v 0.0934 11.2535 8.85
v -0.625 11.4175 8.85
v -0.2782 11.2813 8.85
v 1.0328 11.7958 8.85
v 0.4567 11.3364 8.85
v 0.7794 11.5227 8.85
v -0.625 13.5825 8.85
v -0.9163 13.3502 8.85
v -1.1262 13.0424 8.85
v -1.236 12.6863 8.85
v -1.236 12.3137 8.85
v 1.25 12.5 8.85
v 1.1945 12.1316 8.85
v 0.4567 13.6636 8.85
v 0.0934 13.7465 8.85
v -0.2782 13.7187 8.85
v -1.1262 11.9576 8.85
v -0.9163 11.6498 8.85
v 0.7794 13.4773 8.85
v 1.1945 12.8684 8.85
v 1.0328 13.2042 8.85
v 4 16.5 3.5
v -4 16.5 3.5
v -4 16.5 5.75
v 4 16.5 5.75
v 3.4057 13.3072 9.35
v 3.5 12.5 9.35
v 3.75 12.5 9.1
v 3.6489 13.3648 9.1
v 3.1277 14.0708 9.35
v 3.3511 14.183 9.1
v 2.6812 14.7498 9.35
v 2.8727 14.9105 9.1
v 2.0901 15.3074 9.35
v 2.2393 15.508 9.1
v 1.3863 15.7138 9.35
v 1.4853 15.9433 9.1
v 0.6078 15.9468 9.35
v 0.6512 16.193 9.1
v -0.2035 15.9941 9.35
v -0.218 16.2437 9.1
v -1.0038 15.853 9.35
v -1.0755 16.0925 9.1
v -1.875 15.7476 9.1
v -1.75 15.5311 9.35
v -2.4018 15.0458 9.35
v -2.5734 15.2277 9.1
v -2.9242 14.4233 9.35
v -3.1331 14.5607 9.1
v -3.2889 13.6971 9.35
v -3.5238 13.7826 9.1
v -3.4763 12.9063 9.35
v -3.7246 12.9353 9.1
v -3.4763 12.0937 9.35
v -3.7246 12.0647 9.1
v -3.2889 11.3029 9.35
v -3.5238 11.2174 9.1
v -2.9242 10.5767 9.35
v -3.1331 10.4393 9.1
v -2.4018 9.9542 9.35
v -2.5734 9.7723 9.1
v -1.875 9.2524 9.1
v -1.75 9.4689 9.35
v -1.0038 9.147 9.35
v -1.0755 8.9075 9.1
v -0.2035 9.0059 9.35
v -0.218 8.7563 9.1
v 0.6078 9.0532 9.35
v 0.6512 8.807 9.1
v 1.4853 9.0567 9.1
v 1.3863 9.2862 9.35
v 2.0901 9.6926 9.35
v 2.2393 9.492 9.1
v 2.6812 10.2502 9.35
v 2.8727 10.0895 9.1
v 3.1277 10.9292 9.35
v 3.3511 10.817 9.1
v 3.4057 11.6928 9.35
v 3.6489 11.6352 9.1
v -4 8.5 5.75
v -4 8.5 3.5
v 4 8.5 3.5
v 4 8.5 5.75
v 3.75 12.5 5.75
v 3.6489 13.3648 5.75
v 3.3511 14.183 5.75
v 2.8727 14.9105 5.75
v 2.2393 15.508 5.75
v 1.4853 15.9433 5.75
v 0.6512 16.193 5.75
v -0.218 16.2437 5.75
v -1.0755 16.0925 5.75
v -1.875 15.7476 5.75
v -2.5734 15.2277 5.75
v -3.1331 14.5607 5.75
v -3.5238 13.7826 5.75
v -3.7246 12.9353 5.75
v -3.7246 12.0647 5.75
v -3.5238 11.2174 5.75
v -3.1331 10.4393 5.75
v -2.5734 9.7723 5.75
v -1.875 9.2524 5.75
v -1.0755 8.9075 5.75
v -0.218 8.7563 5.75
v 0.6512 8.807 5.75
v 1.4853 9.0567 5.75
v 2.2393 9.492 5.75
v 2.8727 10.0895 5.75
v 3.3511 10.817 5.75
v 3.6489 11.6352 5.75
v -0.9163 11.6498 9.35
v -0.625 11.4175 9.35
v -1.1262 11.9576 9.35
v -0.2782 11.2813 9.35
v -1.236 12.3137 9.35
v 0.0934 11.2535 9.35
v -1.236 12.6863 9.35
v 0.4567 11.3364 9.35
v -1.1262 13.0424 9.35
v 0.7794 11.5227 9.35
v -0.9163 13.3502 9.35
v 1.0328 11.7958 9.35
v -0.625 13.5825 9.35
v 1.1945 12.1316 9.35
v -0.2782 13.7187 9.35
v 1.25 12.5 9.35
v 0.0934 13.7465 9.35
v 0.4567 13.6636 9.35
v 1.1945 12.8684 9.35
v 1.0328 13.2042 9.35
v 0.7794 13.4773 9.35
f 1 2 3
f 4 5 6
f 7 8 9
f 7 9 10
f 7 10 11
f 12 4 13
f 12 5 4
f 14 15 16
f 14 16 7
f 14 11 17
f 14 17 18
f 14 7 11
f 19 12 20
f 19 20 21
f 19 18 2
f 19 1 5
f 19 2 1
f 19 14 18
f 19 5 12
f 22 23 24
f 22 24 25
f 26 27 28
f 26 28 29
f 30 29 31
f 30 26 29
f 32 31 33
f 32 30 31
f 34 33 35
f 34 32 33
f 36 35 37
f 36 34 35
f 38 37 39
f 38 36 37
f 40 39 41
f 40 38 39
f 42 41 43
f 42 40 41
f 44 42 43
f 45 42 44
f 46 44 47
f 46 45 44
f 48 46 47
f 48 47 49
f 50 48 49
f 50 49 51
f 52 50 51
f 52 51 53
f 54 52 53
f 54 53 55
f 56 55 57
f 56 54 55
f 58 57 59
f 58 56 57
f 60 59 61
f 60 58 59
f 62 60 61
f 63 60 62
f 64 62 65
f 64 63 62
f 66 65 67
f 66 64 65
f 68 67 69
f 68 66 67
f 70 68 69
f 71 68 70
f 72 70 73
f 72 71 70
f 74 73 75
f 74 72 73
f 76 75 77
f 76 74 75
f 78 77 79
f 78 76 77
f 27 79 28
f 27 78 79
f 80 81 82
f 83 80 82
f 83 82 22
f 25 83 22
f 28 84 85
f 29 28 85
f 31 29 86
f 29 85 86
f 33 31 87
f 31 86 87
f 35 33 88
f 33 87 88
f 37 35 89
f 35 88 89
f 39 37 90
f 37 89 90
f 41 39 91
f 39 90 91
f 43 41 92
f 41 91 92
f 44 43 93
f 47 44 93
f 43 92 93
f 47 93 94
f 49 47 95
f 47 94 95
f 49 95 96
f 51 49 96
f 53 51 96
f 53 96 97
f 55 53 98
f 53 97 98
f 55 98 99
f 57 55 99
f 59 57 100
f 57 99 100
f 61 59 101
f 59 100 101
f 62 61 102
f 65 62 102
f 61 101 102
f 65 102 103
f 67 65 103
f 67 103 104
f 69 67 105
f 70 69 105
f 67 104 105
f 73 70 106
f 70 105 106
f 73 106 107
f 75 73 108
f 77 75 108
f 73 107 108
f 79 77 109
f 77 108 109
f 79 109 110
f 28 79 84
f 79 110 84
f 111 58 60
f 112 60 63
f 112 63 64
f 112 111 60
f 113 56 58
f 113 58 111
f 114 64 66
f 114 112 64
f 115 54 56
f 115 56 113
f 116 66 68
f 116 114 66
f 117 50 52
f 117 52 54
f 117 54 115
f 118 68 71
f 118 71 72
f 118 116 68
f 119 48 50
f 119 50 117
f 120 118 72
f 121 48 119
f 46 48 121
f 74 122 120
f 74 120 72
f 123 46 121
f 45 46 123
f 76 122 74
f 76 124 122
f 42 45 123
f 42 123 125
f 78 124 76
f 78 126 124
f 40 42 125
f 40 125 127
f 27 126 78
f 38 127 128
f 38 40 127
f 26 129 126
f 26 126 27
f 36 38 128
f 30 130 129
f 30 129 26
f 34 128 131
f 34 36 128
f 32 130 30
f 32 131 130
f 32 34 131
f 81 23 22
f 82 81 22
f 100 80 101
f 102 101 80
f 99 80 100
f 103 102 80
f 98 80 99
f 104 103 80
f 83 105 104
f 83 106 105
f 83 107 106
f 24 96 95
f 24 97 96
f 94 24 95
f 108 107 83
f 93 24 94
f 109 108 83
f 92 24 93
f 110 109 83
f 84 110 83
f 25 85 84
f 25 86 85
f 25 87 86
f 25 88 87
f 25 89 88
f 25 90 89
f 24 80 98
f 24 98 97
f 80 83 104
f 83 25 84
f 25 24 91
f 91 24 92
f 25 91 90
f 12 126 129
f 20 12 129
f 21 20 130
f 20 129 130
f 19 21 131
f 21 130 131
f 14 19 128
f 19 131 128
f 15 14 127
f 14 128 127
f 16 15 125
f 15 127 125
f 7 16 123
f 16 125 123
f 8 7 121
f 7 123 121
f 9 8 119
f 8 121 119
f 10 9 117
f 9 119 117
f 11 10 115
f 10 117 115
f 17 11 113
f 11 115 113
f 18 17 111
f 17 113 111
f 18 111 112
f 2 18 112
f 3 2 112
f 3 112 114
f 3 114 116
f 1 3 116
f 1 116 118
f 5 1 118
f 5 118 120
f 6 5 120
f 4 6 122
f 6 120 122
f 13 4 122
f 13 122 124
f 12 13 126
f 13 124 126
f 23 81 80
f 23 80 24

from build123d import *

# Parameters (mm, degrees)
SKETCH005_W     = 8
SKETCH005_H     = 8
PAD003_DEPTH    = 2.25
SKETCH006_R     = 3.75
PAD004_DEPTH    = 3.6
SKETCH007_R     = 1.25
POCKET001_DEPTH = 0.5
CHAMFER001_SIZE = 0.25


with BuildPart() as part:
    # Sketch005 (on Face1 of CopyThickness) → Pad003 (new body)
    with BuildSketch(Plane.XY.offset(3.5)):
        with Locations((0, 12.5)):
            Rectangle(SKETCH005_W, SKETCH005_H)
    extrude(amount=PAD003_DEPTH)

    # Sketch006 (on Face6 of Pad003) → Pad004 (join)
    with BuildSketch(Plane.XY.offset(5.75)):
        with Locations((0, 12.5)):
            Circle(SKETCH006_R)
    extrude(amount=PAD004_DEPTH)

    # Sketch007 (on Face8 of Pad004) → Pocket001 (cut)
    with BuildSketch(Plane.XY.offset(9.35)):
        with Locations((0, 12.5)):
            Circle(SKETCH007_R)
    extrude(amount=-POCKET001_DEPTH, mode=Mode.SUBTRACT)

    # Chamfer001
    chamfer001_edges = [part.edges().sort_by_distance(p)[0] for p in [
        (-3.75, 12.5, 9.35),
    ]]
    chamfer(chamfer001_edges, length=CHAMFER001_SIZE)


solid = part.part
